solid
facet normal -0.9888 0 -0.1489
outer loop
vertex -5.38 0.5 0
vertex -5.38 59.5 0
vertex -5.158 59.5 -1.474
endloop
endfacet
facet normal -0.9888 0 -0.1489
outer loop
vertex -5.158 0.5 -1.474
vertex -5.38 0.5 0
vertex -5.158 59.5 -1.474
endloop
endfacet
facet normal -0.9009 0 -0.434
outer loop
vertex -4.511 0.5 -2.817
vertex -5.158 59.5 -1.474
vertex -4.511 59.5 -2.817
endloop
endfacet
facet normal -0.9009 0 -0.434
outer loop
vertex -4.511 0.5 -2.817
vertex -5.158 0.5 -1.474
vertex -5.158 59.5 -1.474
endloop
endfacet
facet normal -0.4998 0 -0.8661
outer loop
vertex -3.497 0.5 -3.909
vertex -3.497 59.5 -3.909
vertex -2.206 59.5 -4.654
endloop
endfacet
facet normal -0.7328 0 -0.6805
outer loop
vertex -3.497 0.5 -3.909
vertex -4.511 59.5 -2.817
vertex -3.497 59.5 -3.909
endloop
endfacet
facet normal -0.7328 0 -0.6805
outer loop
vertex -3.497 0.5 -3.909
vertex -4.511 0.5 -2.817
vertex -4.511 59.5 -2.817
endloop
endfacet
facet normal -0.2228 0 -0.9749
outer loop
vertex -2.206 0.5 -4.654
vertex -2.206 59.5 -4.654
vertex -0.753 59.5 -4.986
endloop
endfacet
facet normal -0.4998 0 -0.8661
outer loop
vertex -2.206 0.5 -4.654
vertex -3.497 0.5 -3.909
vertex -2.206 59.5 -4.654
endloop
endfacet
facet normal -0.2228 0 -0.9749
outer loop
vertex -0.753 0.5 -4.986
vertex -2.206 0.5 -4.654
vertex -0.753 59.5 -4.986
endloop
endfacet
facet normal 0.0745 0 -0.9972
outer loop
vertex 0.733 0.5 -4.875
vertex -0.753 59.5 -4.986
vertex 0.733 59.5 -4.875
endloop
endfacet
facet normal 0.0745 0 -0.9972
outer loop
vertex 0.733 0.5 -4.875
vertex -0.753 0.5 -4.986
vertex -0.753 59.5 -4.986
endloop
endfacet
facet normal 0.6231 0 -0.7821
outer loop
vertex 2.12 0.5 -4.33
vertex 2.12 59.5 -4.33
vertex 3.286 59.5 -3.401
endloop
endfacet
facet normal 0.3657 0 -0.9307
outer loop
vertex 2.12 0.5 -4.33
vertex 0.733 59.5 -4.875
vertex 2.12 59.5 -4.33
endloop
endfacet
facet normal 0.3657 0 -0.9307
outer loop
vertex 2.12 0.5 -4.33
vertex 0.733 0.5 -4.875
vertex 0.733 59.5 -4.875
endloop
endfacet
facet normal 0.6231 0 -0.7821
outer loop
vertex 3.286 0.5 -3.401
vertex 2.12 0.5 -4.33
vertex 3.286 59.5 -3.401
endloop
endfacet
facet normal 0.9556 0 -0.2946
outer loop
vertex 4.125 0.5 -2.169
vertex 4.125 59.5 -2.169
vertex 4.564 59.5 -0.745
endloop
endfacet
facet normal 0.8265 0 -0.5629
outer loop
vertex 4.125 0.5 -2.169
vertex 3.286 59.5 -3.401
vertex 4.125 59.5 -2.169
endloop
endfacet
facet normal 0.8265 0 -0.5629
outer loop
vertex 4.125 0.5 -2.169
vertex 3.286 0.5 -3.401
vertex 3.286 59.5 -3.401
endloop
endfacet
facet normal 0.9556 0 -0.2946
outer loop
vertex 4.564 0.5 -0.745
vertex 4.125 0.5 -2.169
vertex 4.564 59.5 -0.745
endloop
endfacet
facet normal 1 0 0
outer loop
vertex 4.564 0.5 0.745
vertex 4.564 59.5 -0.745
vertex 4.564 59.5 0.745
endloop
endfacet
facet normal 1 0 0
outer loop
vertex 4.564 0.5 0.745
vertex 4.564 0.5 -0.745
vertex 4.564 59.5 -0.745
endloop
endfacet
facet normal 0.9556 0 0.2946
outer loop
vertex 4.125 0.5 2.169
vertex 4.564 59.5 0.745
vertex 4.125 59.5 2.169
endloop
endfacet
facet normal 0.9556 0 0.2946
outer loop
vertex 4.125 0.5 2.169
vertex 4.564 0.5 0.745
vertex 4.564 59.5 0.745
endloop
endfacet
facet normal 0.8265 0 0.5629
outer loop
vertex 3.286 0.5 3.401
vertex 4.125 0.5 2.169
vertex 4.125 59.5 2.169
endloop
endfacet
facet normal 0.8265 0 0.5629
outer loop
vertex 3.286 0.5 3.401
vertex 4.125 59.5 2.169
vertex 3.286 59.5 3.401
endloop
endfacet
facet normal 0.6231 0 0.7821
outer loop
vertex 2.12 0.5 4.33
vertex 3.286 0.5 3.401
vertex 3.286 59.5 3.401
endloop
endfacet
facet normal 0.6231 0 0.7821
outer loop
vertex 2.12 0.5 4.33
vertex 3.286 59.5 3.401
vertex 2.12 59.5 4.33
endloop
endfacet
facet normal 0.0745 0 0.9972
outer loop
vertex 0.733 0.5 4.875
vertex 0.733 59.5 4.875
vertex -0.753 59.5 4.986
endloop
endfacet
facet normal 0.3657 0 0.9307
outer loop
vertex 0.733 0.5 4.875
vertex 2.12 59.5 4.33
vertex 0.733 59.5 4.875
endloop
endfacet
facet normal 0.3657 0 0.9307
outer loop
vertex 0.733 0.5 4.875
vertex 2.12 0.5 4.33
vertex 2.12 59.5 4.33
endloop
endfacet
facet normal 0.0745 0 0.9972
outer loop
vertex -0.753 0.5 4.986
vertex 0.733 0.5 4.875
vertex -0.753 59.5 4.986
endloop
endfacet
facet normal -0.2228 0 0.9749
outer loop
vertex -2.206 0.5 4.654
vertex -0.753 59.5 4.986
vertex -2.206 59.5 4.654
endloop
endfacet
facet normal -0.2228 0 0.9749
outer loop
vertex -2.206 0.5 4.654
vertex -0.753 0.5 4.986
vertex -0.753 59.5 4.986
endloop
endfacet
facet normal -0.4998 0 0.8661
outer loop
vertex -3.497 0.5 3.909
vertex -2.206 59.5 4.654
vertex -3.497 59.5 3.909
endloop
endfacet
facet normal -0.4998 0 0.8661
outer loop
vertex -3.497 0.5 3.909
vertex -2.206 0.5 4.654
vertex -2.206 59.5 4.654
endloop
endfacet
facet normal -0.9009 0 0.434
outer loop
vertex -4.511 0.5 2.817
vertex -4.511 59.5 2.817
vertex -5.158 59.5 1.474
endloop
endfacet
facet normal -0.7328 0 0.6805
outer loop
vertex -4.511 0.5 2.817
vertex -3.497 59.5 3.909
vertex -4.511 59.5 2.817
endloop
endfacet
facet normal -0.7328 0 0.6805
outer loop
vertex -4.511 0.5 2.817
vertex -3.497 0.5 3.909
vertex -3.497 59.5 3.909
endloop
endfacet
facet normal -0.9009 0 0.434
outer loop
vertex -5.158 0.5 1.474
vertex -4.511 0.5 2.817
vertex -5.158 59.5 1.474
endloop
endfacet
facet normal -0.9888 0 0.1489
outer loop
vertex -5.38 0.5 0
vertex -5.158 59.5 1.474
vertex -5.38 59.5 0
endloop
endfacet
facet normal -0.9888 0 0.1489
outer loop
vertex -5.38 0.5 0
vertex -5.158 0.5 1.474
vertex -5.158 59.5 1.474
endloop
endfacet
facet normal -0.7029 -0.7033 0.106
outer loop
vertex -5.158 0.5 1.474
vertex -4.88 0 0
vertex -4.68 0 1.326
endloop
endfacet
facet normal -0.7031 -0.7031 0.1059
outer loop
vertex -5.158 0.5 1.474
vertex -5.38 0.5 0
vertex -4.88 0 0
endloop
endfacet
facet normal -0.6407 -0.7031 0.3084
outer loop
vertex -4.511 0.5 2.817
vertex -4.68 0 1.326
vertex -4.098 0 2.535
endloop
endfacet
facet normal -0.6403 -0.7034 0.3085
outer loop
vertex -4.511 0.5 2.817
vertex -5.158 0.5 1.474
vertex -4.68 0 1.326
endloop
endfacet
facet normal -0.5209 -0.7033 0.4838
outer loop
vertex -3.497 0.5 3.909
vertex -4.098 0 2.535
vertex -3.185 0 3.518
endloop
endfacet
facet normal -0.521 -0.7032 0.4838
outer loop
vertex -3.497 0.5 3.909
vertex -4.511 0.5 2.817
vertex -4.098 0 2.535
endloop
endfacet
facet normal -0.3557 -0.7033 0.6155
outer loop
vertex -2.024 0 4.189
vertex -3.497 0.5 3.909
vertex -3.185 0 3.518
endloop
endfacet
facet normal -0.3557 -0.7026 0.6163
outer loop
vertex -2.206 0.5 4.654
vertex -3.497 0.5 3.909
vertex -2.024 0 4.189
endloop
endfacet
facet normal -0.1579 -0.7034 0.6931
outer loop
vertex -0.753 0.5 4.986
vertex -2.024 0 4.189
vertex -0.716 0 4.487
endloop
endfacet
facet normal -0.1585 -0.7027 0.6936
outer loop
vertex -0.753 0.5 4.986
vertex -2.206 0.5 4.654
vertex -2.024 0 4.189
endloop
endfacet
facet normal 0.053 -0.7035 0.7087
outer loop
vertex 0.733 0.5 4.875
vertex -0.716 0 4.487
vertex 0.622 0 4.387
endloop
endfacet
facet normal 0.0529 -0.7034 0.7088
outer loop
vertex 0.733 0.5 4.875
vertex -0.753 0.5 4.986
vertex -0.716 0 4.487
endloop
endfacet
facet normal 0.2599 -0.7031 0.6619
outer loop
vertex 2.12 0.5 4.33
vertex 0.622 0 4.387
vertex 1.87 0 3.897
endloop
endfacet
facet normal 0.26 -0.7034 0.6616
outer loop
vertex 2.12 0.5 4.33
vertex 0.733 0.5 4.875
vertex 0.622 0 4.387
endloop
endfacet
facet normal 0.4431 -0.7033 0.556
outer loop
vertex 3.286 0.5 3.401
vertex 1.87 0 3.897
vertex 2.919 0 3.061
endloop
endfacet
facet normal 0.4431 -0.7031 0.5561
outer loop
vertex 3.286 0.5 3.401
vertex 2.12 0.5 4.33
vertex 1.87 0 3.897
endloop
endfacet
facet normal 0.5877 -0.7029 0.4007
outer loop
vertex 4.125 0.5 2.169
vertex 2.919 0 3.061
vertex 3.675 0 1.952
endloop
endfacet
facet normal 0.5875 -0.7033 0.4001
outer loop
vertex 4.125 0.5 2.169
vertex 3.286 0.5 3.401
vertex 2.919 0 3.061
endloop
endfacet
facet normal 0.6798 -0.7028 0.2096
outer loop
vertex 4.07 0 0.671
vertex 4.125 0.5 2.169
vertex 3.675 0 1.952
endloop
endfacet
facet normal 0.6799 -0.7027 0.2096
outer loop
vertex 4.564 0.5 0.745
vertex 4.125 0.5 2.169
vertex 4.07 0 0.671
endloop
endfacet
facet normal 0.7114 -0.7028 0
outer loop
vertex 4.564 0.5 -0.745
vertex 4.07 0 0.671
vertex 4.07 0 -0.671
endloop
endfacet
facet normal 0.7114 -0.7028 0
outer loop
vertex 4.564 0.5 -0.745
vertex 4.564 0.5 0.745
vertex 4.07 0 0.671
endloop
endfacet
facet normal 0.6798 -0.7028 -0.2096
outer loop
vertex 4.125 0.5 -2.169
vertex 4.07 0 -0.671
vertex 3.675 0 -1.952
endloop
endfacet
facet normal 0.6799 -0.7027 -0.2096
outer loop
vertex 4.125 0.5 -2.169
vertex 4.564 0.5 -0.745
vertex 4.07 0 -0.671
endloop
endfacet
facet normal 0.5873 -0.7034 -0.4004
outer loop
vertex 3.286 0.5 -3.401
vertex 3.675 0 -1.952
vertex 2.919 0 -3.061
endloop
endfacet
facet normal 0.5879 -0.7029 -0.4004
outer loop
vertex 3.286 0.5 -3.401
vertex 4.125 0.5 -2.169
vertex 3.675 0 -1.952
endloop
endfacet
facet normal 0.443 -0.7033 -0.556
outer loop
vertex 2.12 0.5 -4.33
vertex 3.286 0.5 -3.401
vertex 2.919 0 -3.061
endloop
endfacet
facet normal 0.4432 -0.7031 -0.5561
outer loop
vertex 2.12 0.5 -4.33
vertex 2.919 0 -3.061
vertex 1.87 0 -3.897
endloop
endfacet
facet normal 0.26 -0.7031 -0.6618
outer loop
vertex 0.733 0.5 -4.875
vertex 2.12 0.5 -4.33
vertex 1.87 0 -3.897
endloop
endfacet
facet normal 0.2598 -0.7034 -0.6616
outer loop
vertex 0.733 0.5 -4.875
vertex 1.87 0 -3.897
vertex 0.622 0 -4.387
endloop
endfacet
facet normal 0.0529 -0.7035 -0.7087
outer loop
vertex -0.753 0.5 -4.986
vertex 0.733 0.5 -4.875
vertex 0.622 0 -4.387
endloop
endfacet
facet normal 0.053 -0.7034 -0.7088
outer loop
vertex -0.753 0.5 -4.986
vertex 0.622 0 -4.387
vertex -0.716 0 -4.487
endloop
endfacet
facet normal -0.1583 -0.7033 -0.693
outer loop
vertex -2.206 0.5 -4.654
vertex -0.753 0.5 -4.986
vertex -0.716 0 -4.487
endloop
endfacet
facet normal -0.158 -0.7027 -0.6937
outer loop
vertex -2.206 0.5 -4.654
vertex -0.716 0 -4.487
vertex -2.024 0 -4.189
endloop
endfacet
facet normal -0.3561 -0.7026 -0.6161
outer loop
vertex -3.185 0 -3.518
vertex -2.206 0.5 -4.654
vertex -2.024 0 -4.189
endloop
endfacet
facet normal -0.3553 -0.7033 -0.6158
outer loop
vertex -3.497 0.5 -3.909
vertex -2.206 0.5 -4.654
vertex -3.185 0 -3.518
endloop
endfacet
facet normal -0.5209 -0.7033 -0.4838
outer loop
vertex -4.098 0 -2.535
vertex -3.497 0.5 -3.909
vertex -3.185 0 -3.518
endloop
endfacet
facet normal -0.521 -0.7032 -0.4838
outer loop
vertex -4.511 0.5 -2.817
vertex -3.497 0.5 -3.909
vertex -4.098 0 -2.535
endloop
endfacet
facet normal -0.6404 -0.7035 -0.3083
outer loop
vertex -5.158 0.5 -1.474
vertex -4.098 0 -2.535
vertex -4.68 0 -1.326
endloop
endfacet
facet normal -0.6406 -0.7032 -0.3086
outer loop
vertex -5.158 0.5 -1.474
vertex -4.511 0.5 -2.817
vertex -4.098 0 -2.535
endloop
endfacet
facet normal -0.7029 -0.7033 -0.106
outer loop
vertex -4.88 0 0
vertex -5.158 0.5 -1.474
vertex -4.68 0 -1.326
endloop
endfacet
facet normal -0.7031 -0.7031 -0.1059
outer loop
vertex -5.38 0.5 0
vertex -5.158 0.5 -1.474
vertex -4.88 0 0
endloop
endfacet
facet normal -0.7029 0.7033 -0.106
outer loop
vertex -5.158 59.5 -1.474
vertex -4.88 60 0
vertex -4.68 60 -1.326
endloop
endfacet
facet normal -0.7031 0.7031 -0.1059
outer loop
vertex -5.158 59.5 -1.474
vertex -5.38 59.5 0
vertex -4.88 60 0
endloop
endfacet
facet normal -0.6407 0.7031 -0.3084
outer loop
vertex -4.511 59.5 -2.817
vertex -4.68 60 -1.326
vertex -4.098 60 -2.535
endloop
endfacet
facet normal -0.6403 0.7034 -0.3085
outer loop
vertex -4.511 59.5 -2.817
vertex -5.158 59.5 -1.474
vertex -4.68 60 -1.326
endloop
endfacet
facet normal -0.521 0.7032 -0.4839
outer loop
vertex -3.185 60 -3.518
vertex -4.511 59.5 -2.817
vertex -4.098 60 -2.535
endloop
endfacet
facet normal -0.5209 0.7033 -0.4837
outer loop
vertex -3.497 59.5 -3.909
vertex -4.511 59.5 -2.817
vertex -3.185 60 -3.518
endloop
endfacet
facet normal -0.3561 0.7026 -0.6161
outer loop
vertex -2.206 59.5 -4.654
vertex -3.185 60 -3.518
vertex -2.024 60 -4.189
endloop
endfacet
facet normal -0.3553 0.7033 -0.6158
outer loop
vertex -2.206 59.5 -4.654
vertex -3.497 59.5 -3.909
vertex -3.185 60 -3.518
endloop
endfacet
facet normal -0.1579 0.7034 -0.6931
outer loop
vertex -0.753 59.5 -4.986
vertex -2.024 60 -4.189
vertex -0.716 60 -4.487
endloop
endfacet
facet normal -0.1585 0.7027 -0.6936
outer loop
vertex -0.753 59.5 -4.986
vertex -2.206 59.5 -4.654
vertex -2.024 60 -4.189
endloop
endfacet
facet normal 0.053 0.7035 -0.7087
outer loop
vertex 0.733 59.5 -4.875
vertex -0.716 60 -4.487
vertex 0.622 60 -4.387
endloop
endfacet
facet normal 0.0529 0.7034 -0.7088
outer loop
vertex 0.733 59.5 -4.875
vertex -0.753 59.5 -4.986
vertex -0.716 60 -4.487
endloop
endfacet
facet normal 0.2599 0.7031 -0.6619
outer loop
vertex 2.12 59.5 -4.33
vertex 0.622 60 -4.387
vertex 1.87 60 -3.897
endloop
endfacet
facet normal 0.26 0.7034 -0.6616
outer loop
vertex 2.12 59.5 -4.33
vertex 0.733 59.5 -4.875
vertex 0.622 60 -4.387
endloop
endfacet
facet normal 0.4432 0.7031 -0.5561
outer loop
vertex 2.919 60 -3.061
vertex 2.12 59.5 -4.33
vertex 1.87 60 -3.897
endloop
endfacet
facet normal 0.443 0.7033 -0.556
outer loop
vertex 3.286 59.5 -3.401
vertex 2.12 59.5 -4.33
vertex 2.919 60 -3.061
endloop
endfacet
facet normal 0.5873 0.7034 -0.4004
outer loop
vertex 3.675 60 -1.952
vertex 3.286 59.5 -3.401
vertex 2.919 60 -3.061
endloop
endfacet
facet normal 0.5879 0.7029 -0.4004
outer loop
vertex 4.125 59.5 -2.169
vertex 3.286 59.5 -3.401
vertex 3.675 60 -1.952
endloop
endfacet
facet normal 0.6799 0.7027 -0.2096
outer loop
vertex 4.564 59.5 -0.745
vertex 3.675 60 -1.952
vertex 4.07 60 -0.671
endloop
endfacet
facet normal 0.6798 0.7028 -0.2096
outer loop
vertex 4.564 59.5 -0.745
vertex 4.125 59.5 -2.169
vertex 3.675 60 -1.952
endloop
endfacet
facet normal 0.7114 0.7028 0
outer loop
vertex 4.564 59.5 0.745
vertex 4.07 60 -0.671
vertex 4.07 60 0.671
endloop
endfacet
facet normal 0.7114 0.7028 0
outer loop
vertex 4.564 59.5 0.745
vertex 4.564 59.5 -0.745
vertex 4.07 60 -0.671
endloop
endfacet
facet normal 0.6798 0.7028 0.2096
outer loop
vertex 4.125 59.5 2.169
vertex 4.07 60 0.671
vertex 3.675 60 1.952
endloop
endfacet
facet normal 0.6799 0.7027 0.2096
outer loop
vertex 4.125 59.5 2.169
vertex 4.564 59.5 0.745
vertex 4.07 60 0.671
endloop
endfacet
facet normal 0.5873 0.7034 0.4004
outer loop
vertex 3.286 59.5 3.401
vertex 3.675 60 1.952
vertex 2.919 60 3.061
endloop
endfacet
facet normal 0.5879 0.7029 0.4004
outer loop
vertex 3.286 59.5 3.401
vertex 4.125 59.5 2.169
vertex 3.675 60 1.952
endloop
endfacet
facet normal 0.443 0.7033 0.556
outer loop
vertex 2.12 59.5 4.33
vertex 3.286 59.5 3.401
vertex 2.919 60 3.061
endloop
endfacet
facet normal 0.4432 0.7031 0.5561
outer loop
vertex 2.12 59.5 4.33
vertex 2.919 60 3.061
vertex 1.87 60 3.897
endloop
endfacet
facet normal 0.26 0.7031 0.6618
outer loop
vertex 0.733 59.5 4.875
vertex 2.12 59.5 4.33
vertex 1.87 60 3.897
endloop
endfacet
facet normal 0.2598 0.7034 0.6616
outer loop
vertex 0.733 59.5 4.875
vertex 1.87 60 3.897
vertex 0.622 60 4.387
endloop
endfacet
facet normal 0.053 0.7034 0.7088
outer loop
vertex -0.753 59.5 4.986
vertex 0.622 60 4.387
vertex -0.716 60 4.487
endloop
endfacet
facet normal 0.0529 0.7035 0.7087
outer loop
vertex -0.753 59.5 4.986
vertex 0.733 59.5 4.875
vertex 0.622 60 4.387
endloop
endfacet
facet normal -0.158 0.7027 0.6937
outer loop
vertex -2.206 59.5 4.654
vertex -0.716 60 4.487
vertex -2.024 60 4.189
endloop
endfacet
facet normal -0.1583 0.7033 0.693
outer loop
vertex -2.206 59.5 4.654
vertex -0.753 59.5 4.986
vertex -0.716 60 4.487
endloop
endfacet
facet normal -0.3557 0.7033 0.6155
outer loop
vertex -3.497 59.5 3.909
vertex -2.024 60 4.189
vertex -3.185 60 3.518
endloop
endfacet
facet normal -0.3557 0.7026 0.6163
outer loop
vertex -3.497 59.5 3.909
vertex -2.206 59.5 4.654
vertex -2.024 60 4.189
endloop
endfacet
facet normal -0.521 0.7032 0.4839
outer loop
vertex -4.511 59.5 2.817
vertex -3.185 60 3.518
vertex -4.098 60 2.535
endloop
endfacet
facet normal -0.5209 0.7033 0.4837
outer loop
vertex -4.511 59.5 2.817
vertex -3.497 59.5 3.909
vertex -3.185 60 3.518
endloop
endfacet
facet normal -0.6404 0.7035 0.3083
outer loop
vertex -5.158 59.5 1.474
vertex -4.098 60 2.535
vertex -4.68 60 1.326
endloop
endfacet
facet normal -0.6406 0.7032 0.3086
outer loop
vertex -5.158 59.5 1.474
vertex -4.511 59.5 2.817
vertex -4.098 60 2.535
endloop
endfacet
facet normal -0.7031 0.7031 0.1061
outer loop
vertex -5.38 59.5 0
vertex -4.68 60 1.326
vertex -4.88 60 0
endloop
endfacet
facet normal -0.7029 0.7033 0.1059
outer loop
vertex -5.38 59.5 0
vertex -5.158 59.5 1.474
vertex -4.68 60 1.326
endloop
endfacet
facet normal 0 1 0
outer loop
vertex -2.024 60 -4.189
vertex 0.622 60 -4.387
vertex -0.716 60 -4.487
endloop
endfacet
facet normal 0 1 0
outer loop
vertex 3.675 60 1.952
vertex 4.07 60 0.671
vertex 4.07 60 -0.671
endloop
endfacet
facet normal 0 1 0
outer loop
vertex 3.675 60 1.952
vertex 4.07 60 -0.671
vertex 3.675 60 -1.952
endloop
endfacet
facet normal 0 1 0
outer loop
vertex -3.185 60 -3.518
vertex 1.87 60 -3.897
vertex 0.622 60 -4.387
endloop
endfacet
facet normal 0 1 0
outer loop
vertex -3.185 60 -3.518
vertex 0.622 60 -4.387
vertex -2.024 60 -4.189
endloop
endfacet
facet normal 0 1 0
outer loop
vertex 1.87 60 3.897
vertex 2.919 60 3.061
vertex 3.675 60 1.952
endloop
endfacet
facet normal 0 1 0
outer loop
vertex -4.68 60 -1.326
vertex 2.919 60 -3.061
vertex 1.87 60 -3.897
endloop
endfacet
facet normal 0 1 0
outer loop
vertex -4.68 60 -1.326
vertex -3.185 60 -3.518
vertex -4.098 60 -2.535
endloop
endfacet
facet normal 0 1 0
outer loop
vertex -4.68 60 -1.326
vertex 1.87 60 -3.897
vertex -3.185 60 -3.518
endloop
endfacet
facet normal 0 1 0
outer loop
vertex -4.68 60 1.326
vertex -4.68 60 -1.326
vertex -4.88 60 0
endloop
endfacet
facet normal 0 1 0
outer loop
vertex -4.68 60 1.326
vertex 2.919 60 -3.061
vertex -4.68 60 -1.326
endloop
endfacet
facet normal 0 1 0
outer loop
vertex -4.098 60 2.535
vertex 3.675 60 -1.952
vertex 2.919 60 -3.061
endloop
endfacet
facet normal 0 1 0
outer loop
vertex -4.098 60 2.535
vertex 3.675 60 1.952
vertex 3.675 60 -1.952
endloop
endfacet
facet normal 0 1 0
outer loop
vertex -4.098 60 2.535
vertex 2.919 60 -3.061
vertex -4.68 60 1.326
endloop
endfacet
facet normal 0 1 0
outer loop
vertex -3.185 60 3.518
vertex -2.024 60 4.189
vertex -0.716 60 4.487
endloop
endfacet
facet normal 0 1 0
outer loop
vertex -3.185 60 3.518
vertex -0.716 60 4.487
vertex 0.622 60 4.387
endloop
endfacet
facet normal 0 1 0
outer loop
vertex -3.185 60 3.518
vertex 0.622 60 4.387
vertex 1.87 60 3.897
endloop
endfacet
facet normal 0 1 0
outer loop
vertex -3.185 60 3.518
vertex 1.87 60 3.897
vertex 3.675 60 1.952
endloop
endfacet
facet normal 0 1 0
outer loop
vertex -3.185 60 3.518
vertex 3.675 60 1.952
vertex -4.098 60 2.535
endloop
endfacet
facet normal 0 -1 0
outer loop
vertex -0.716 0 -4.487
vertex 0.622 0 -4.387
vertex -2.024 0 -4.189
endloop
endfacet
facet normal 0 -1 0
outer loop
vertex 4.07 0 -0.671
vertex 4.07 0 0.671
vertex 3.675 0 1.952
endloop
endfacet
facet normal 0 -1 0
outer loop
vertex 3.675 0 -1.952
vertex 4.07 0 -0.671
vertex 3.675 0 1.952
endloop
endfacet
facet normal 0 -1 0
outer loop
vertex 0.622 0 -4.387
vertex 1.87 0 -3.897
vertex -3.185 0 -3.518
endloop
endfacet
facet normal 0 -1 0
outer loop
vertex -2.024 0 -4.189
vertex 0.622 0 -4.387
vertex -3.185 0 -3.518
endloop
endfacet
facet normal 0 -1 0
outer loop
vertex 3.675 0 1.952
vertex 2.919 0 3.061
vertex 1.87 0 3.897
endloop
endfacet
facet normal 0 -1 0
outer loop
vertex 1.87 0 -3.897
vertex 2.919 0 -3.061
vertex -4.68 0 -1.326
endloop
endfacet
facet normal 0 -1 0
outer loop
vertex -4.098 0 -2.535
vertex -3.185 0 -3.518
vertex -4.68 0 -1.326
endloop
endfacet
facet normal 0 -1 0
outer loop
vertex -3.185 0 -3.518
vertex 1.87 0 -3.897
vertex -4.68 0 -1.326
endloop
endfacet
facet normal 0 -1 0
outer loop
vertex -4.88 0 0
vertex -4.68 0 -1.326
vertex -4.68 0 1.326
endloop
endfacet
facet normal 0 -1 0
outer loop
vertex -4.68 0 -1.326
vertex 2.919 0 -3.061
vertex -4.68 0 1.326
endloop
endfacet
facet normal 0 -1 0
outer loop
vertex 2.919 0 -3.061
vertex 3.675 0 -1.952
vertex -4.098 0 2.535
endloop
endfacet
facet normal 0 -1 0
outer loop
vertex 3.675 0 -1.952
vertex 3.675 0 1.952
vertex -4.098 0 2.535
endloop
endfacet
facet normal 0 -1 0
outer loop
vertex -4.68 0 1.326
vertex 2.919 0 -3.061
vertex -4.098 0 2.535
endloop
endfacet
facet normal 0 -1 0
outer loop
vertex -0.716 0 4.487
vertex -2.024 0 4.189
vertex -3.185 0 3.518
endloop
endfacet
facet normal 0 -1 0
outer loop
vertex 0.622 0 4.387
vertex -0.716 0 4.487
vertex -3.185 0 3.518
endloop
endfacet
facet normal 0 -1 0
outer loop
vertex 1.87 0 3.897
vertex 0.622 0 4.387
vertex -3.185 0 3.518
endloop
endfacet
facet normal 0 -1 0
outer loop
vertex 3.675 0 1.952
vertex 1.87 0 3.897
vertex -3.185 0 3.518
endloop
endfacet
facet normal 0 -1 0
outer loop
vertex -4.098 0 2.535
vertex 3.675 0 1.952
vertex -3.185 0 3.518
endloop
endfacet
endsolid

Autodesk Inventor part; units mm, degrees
ref_plane "YZ Plane" through (0, 0, 0) normal (1, 0, 0) x (0, 1, 0)
ref_plane "XZ Plane" through (0, 0, 0) normal (0, 1, 0) x (-1, 0, 0)
ref_plane "XY Plane" through (0, 0, 0) normal (0, 0, 1) x (1, 0, 0)
sketch "Boceto1" plane through (0, 0, 0) normal (0, 1, 0) x (-1, 0, 0)
  circle A0 centre (0.3797, 0) radius 5
  point P0 (0, 0)
  dimension "d0" = 10
extrude "Extrusión1" add sketch "Boceto1" along normal blind 60
chamfer "Chaflán1" distance 0.5 angle 45 1 edges at (4.6203, 60, 0)
chamfer "Chaflán2" distance 0.5 angle 45 1 edges at (4.6203, 0, 0)
properties part number "EJE"
